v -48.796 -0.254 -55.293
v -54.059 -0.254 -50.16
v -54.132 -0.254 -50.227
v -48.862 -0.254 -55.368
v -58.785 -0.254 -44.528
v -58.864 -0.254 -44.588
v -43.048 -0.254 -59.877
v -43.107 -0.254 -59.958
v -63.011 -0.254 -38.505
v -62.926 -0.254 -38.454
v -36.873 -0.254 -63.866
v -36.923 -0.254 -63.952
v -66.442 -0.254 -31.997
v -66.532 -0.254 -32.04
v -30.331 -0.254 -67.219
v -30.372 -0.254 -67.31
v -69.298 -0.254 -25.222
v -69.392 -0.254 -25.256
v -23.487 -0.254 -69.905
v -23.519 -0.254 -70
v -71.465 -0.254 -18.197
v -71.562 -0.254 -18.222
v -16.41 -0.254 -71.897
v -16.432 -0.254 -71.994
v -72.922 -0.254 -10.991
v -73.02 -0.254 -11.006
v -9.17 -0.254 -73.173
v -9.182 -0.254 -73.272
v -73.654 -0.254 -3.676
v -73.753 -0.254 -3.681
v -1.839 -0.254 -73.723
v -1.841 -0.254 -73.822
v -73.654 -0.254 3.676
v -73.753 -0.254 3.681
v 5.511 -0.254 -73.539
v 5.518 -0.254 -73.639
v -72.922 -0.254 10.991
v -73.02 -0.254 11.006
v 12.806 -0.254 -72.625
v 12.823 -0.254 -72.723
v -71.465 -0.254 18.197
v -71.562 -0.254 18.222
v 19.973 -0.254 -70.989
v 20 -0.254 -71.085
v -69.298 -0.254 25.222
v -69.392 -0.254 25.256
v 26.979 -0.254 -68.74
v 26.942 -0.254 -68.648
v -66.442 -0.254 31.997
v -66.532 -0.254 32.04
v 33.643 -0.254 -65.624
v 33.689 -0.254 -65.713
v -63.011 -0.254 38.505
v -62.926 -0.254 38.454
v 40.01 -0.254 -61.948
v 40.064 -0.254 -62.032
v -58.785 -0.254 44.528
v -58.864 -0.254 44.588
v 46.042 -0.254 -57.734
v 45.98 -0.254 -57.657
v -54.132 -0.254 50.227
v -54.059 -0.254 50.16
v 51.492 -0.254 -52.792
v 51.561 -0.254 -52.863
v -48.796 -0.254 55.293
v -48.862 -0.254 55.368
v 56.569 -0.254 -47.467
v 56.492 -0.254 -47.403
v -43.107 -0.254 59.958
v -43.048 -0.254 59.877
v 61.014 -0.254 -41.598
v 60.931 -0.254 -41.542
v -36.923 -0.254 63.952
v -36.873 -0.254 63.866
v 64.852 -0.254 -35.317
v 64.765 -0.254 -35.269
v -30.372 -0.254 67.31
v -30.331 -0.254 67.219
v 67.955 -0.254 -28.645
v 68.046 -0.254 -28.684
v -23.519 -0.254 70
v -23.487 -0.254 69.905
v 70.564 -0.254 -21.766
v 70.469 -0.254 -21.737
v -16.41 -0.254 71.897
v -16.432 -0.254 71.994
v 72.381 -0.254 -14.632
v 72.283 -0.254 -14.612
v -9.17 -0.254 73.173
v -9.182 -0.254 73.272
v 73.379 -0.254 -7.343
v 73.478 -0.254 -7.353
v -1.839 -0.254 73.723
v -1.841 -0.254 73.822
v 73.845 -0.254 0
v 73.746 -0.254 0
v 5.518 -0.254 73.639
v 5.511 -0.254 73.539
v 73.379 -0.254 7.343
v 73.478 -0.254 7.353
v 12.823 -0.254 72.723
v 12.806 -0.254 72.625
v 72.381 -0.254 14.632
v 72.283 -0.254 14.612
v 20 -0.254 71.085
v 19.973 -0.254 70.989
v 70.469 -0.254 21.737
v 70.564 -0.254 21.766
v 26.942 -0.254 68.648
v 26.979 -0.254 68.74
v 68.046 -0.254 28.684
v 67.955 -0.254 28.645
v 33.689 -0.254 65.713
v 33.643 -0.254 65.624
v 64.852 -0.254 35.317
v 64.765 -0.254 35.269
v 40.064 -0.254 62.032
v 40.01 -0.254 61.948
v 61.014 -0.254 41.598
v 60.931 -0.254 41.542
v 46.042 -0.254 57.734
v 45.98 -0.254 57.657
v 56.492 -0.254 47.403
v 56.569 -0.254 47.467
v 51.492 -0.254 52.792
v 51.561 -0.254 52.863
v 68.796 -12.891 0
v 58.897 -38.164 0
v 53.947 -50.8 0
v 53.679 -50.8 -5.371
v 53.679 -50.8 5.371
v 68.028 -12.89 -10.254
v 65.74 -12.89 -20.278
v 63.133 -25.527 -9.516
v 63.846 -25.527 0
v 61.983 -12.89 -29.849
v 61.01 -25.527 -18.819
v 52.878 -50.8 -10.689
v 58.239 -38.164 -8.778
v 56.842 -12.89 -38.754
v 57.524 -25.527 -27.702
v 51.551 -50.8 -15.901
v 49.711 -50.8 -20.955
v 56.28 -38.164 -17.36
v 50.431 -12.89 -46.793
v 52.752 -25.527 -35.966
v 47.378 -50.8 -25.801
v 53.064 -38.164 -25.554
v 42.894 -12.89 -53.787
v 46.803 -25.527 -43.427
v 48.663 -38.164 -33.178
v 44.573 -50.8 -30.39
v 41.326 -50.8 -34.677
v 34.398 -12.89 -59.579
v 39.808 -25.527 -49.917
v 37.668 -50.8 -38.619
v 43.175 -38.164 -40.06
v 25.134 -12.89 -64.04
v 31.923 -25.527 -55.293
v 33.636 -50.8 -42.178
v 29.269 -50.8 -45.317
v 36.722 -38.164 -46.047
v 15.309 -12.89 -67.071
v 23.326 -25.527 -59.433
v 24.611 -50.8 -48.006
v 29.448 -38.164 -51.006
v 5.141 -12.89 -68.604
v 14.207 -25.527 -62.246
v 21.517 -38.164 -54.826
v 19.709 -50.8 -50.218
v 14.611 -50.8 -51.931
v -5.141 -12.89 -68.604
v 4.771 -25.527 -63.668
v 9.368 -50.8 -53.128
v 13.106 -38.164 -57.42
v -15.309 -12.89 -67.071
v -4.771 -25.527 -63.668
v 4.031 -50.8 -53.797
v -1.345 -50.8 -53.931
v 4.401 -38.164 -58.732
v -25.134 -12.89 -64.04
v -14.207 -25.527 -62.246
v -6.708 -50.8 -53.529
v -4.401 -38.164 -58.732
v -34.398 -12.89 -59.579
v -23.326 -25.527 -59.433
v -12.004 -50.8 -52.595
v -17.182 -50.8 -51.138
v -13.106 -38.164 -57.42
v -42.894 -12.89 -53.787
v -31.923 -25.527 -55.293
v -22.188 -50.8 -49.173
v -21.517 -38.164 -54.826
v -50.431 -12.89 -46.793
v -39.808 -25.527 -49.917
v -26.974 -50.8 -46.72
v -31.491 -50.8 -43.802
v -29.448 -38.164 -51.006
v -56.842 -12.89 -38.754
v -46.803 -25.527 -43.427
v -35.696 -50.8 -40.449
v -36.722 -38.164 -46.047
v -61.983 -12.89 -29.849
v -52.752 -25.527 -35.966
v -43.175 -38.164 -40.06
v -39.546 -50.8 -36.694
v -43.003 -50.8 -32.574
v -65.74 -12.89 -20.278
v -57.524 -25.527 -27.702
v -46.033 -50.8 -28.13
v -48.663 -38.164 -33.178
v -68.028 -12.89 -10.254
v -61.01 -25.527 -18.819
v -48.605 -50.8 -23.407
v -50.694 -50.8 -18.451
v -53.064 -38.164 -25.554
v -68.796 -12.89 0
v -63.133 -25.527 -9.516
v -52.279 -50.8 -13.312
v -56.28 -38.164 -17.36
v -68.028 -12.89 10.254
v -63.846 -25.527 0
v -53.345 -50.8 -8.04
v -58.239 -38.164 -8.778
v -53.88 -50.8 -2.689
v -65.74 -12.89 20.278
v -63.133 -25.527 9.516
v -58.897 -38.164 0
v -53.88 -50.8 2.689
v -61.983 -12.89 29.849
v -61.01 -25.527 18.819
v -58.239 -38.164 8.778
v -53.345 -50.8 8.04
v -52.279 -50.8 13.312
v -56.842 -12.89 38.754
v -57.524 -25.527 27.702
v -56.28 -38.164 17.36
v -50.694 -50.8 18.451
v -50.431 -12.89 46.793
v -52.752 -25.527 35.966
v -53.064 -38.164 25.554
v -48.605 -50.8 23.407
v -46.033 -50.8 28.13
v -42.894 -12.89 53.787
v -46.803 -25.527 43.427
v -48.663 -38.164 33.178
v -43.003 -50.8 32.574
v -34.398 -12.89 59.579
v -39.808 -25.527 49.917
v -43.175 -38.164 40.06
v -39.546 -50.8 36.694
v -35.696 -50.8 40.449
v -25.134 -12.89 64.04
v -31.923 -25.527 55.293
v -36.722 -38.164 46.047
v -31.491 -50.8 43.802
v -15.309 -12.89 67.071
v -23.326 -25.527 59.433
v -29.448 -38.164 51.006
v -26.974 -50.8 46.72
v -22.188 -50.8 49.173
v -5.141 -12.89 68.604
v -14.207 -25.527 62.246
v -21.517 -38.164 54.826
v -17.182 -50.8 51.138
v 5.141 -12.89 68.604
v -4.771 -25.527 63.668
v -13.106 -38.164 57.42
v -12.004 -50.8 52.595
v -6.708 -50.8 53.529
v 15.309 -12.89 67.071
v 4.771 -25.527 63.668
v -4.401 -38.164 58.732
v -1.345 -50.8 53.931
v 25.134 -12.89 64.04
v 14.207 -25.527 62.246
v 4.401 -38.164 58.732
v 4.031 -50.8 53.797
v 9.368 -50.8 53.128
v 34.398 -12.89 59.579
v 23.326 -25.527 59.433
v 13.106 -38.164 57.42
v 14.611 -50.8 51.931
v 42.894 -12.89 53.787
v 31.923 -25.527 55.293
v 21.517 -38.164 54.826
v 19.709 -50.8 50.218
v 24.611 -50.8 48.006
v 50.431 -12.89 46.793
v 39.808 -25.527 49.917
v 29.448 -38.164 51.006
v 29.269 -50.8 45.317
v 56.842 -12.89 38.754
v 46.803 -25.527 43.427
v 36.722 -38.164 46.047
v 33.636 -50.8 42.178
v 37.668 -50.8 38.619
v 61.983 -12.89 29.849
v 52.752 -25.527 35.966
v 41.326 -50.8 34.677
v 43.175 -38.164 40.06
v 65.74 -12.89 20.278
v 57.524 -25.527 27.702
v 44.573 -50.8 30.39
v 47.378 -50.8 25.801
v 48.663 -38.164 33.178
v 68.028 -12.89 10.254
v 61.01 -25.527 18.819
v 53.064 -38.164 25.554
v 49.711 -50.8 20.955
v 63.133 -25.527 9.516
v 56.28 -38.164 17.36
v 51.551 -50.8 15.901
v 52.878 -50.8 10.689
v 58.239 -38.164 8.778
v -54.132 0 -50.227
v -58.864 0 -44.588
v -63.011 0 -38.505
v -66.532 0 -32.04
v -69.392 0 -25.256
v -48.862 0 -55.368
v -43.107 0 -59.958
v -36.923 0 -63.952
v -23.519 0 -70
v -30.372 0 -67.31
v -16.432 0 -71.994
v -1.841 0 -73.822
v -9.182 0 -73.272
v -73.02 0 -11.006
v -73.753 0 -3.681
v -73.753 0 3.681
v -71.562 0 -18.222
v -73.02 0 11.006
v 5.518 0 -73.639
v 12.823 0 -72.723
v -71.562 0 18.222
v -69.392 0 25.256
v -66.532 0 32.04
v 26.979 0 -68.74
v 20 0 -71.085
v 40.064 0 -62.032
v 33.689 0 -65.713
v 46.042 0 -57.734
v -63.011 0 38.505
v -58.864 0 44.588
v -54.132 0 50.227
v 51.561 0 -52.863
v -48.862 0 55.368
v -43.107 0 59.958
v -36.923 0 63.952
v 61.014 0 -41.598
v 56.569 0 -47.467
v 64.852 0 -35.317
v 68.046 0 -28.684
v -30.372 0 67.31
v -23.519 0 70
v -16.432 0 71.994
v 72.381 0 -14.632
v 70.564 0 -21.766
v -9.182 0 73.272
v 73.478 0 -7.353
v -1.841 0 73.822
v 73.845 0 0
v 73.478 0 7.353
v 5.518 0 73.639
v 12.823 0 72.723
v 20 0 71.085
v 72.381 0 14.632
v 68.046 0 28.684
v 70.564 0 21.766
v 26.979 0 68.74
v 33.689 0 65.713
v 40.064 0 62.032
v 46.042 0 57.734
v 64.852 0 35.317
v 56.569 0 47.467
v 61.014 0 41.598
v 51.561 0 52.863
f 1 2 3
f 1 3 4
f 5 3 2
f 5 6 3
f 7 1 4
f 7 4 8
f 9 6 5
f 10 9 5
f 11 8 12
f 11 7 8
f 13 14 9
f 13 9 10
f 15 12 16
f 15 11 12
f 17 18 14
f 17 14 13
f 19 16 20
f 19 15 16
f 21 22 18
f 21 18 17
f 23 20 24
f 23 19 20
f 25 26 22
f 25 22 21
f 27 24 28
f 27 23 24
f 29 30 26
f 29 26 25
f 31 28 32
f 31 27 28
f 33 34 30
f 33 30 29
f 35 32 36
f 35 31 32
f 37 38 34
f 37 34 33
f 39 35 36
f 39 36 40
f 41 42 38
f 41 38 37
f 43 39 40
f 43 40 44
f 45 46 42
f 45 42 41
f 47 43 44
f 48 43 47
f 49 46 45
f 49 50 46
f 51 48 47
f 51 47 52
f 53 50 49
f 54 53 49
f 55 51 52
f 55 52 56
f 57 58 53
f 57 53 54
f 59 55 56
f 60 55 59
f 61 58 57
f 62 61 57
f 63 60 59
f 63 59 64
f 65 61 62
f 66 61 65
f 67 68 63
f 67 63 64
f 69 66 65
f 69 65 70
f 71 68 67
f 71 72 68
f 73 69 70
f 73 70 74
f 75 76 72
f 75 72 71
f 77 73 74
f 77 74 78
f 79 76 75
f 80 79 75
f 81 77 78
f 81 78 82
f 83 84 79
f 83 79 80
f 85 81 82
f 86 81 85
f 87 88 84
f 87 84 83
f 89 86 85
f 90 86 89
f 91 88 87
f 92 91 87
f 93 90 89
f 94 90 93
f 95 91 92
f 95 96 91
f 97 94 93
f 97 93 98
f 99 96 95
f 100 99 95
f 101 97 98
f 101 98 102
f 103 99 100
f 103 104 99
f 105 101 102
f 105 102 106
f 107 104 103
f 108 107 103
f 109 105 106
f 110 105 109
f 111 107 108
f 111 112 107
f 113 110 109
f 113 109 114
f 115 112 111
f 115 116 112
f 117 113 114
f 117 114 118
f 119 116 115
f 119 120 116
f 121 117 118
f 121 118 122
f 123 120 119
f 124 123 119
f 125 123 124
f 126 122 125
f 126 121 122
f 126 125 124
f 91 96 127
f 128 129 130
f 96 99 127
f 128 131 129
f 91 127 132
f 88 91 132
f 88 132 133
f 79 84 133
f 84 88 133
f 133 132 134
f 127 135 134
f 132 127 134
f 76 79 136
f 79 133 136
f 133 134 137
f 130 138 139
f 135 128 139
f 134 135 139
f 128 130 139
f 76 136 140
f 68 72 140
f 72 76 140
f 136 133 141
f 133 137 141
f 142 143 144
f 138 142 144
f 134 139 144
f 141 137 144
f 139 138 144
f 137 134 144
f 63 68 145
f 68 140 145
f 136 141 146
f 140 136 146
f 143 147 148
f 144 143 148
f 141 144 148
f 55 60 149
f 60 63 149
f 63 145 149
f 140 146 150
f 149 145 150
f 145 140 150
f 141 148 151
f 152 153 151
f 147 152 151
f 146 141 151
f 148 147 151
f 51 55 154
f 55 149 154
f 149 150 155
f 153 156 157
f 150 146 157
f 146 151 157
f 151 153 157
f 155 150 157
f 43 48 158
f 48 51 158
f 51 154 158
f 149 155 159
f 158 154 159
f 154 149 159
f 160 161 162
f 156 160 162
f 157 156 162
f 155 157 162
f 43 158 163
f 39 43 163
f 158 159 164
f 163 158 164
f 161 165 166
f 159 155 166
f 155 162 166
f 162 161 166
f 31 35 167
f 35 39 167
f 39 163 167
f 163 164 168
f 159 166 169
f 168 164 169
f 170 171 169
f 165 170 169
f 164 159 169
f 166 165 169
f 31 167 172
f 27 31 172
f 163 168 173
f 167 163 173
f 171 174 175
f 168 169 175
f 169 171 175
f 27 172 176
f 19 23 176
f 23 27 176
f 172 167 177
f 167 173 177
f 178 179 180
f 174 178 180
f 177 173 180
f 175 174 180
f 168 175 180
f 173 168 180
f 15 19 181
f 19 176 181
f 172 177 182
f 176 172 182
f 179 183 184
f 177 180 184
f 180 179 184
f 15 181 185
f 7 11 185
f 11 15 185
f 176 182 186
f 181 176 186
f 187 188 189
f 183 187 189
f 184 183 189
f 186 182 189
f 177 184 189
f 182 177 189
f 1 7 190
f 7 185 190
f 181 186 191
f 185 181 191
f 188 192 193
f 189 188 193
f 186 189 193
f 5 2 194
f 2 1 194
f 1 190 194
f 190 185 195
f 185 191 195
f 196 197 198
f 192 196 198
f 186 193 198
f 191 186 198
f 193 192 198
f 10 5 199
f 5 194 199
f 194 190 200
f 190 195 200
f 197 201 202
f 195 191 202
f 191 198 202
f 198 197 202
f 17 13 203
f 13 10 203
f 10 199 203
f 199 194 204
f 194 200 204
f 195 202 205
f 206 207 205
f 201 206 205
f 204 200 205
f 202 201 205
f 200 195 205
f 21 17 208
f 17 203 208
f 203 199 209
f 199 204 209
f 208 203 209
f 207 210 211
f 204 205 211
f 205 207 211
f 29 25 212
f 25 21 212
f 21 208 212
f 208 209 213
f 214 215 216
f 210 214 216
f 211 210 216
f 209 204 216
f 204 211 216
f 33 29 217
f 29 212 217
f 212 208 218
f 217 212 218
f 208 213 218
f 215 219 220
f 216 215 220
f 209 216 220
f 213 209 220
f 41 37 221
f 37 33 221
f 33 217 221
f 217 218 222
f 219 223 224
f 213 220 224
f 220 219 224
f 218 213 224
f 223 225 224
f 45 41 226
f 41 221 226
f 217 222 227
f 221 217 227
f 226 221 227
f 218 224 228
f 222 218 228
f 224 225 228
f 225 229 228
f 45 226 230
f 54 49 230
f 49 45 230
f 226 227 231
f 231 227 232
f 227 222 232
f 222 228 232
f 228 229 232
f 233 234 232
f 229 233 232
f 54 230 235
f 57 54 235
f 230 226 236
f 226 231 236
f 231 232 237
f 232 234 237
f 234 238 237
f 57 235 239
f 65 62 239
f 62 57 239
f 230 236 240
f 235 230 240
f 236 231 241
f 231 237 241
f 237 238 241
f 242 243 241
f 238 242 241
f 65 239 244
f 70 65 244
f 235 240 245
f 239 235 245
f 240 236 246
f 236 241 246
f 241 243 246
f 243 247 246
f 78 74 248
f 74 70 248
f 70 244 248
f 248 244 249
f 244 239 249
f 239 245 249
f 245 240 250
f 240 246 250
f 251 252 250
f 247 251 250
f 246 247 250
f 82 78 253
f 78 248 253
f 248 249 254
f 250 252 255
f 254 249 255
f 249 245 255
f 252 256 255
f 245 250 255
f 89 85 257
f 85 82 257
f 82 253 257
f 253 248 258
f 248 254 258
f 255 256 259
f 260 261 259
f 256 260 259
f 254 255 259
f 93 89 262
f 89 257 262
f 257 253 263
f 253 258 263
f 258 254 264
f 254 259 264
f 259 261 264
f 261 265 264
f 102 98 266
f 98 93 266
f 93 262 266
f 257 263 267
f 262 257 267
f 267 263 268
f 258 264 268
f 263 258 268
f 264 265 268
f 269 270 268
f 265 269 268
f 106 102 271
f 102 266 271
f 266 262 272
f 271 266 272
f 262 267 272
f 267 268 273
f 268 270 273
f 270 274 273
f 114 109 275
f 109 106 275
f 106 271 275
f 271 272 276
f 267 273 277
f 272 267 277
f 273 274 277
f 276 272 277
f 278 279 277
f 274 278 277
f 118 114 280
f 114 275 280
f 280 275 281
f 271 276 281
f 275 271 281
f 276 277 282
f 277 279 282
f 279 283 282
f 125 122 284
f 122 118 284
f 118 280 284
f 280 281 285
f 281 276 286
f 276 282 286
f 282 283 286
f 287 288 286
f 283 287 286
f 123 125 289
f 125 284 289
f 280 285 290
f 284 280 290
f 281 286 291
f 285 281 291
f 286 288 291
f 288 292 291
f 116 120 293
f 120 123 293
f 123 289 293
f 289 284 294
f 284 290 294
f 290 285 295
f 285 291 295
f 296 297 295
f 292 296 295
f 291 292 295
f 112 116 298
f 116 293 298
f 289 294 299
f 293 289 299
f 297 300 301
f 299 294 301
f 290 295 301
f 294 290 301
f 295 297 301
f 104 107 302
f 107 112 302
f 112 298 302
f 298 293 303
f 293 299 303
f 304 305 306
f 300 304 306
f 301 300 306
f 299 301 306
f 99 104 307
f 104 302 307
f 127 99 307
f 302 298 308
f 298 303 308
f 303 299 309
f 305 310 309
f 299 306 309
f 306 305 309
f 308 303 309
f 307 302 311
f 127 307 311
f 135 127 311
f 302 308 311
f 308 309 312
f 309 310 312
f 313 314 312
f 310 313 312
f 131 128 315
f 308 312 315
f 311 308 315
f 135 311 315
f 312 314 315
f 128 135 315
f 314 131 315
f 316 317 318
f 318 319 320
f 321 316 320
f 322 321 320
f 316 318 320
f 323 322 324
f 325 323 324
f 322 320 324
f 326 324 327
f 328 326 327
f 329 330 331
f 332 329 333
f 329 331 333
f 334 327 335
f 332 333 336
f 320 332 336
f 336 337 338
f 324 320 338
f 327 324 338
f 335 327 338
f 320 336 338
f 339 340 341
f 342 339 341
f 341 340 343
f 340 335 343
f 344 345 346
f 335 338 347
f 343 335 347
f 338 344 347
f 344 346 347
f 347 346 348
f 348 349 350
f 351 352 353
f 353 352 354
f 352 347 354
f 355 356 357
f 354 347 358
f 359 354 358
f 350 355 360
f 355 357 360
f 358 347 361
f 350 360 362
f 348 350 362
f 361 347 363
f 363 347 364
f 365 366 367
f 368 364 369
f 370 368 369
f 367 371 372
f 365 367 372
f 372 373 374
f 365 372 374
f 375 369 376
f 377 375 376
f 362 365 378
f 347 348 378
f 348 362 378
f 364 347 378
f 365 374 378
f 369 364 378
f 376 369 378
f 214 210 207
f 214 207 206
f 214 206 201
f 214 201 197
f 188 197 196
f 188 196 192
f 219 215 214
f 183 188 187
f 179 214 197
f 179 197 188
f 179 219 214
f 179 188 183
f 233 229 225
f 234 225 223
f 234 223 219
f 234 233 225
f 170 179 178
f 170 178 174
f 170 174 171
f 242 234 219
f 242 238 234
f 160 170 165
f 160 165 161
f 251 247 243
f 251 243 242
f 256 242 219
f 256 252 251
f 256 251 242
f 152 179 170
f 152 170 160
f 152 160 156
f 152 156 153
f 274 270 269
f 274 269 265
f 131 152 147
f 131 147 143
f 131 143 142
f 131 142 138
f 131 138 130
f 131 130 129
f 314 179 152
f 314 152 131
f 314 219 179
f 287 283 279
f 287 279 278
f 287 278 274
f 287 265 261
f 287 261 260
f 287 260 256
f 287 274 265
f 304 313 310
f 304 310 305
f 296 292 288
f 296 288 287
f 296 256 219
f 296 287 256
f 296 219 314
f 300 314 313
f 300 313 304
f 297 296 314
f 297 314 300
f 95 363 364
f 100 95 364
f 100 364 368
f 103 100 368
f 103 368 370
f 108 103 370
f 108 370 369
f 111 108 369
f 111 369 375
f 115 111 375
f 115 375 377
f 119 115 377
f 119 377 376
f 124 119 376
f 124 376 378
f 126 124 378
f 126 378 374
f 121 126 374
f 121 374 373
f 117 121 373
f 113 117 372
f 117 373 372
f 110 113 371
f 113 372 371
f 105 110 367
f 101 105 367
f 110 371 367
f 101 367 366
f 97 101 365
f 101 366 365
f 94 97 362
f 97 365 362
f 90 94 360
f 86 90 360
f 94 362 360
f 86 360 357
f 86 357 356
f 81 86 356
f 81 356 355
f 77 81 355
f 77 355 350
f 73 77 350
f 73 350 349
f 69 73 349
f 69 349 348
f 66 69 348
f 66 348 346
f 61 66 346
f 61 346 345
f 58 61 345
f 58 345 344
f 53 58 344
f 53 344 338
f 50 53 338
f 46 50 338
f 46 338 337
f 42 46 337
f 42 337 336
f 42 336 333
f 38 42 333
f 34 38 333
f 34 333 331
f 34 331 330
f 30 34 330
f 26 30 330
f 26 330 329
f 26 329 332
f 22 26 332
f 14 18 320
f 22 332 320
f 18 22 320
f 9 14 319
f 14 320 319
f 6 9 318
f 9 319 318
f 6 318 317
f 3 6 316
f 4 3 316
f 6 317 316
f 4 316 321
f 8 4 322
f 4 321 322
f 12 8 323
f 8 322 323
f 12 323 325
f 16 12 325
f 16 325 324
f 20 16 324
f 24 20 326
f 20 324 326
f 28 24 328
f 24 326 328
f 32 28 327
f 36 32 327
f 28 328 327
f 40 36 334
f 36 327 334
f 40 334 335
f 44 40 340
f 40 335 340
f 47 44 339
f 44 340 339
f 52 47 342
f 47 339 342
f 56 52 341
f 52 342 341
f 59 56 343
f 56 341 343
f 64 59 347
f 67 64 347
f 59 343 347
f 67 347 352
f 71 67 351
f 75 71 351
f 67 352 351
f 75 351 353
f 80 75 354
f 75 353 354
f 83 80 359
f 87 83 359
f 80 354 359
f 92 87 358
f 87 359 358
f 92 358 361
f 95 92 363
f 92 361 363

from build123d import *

# Parameters (mm, degrees)
F0_R       = 73.8450197524
F1_DEPTH   = 50.8
F2_R       = 73.8450197524
F2_R_2     = 53.9474257016
F3_DEPTH   = 50.546
F1_FACE1_R = 73.8450197524
F1_FACE_R  = 53.9474257016


with BuildPart() as f1:
    # F0 (on Front) → F1 (new body)
    with BuildSketch(Plane.XZ):
        Circle(F0_R)
    extrude(amount=F1_DEPTH)

    # F2 (on face) → F3 (cut)
    with BuildSketch(Plane.XZ.offset(50.8)):
        Circle(F2_R)
        Circle(F2_R_2, mode=Mode.SUBTRACT)
    extrude(amount=-F3_DEPTH, mode=Mode.SUBTRACT)

    # F1_face1 (on face) → F4 section 0
    with BuildSketch(Plane(origin=(0, 0, 0), x_dir=(1, 0, 0), z_dir=(0, 1, 0))):
        Circle(F1_FACE1_R)
    # F1_face (on face) → F4 section 1
    with BuildSketch(Plane.XZ.offset(50.8)):
        Circle(F1_FACE_R)
    loft()


solid = f1.part
